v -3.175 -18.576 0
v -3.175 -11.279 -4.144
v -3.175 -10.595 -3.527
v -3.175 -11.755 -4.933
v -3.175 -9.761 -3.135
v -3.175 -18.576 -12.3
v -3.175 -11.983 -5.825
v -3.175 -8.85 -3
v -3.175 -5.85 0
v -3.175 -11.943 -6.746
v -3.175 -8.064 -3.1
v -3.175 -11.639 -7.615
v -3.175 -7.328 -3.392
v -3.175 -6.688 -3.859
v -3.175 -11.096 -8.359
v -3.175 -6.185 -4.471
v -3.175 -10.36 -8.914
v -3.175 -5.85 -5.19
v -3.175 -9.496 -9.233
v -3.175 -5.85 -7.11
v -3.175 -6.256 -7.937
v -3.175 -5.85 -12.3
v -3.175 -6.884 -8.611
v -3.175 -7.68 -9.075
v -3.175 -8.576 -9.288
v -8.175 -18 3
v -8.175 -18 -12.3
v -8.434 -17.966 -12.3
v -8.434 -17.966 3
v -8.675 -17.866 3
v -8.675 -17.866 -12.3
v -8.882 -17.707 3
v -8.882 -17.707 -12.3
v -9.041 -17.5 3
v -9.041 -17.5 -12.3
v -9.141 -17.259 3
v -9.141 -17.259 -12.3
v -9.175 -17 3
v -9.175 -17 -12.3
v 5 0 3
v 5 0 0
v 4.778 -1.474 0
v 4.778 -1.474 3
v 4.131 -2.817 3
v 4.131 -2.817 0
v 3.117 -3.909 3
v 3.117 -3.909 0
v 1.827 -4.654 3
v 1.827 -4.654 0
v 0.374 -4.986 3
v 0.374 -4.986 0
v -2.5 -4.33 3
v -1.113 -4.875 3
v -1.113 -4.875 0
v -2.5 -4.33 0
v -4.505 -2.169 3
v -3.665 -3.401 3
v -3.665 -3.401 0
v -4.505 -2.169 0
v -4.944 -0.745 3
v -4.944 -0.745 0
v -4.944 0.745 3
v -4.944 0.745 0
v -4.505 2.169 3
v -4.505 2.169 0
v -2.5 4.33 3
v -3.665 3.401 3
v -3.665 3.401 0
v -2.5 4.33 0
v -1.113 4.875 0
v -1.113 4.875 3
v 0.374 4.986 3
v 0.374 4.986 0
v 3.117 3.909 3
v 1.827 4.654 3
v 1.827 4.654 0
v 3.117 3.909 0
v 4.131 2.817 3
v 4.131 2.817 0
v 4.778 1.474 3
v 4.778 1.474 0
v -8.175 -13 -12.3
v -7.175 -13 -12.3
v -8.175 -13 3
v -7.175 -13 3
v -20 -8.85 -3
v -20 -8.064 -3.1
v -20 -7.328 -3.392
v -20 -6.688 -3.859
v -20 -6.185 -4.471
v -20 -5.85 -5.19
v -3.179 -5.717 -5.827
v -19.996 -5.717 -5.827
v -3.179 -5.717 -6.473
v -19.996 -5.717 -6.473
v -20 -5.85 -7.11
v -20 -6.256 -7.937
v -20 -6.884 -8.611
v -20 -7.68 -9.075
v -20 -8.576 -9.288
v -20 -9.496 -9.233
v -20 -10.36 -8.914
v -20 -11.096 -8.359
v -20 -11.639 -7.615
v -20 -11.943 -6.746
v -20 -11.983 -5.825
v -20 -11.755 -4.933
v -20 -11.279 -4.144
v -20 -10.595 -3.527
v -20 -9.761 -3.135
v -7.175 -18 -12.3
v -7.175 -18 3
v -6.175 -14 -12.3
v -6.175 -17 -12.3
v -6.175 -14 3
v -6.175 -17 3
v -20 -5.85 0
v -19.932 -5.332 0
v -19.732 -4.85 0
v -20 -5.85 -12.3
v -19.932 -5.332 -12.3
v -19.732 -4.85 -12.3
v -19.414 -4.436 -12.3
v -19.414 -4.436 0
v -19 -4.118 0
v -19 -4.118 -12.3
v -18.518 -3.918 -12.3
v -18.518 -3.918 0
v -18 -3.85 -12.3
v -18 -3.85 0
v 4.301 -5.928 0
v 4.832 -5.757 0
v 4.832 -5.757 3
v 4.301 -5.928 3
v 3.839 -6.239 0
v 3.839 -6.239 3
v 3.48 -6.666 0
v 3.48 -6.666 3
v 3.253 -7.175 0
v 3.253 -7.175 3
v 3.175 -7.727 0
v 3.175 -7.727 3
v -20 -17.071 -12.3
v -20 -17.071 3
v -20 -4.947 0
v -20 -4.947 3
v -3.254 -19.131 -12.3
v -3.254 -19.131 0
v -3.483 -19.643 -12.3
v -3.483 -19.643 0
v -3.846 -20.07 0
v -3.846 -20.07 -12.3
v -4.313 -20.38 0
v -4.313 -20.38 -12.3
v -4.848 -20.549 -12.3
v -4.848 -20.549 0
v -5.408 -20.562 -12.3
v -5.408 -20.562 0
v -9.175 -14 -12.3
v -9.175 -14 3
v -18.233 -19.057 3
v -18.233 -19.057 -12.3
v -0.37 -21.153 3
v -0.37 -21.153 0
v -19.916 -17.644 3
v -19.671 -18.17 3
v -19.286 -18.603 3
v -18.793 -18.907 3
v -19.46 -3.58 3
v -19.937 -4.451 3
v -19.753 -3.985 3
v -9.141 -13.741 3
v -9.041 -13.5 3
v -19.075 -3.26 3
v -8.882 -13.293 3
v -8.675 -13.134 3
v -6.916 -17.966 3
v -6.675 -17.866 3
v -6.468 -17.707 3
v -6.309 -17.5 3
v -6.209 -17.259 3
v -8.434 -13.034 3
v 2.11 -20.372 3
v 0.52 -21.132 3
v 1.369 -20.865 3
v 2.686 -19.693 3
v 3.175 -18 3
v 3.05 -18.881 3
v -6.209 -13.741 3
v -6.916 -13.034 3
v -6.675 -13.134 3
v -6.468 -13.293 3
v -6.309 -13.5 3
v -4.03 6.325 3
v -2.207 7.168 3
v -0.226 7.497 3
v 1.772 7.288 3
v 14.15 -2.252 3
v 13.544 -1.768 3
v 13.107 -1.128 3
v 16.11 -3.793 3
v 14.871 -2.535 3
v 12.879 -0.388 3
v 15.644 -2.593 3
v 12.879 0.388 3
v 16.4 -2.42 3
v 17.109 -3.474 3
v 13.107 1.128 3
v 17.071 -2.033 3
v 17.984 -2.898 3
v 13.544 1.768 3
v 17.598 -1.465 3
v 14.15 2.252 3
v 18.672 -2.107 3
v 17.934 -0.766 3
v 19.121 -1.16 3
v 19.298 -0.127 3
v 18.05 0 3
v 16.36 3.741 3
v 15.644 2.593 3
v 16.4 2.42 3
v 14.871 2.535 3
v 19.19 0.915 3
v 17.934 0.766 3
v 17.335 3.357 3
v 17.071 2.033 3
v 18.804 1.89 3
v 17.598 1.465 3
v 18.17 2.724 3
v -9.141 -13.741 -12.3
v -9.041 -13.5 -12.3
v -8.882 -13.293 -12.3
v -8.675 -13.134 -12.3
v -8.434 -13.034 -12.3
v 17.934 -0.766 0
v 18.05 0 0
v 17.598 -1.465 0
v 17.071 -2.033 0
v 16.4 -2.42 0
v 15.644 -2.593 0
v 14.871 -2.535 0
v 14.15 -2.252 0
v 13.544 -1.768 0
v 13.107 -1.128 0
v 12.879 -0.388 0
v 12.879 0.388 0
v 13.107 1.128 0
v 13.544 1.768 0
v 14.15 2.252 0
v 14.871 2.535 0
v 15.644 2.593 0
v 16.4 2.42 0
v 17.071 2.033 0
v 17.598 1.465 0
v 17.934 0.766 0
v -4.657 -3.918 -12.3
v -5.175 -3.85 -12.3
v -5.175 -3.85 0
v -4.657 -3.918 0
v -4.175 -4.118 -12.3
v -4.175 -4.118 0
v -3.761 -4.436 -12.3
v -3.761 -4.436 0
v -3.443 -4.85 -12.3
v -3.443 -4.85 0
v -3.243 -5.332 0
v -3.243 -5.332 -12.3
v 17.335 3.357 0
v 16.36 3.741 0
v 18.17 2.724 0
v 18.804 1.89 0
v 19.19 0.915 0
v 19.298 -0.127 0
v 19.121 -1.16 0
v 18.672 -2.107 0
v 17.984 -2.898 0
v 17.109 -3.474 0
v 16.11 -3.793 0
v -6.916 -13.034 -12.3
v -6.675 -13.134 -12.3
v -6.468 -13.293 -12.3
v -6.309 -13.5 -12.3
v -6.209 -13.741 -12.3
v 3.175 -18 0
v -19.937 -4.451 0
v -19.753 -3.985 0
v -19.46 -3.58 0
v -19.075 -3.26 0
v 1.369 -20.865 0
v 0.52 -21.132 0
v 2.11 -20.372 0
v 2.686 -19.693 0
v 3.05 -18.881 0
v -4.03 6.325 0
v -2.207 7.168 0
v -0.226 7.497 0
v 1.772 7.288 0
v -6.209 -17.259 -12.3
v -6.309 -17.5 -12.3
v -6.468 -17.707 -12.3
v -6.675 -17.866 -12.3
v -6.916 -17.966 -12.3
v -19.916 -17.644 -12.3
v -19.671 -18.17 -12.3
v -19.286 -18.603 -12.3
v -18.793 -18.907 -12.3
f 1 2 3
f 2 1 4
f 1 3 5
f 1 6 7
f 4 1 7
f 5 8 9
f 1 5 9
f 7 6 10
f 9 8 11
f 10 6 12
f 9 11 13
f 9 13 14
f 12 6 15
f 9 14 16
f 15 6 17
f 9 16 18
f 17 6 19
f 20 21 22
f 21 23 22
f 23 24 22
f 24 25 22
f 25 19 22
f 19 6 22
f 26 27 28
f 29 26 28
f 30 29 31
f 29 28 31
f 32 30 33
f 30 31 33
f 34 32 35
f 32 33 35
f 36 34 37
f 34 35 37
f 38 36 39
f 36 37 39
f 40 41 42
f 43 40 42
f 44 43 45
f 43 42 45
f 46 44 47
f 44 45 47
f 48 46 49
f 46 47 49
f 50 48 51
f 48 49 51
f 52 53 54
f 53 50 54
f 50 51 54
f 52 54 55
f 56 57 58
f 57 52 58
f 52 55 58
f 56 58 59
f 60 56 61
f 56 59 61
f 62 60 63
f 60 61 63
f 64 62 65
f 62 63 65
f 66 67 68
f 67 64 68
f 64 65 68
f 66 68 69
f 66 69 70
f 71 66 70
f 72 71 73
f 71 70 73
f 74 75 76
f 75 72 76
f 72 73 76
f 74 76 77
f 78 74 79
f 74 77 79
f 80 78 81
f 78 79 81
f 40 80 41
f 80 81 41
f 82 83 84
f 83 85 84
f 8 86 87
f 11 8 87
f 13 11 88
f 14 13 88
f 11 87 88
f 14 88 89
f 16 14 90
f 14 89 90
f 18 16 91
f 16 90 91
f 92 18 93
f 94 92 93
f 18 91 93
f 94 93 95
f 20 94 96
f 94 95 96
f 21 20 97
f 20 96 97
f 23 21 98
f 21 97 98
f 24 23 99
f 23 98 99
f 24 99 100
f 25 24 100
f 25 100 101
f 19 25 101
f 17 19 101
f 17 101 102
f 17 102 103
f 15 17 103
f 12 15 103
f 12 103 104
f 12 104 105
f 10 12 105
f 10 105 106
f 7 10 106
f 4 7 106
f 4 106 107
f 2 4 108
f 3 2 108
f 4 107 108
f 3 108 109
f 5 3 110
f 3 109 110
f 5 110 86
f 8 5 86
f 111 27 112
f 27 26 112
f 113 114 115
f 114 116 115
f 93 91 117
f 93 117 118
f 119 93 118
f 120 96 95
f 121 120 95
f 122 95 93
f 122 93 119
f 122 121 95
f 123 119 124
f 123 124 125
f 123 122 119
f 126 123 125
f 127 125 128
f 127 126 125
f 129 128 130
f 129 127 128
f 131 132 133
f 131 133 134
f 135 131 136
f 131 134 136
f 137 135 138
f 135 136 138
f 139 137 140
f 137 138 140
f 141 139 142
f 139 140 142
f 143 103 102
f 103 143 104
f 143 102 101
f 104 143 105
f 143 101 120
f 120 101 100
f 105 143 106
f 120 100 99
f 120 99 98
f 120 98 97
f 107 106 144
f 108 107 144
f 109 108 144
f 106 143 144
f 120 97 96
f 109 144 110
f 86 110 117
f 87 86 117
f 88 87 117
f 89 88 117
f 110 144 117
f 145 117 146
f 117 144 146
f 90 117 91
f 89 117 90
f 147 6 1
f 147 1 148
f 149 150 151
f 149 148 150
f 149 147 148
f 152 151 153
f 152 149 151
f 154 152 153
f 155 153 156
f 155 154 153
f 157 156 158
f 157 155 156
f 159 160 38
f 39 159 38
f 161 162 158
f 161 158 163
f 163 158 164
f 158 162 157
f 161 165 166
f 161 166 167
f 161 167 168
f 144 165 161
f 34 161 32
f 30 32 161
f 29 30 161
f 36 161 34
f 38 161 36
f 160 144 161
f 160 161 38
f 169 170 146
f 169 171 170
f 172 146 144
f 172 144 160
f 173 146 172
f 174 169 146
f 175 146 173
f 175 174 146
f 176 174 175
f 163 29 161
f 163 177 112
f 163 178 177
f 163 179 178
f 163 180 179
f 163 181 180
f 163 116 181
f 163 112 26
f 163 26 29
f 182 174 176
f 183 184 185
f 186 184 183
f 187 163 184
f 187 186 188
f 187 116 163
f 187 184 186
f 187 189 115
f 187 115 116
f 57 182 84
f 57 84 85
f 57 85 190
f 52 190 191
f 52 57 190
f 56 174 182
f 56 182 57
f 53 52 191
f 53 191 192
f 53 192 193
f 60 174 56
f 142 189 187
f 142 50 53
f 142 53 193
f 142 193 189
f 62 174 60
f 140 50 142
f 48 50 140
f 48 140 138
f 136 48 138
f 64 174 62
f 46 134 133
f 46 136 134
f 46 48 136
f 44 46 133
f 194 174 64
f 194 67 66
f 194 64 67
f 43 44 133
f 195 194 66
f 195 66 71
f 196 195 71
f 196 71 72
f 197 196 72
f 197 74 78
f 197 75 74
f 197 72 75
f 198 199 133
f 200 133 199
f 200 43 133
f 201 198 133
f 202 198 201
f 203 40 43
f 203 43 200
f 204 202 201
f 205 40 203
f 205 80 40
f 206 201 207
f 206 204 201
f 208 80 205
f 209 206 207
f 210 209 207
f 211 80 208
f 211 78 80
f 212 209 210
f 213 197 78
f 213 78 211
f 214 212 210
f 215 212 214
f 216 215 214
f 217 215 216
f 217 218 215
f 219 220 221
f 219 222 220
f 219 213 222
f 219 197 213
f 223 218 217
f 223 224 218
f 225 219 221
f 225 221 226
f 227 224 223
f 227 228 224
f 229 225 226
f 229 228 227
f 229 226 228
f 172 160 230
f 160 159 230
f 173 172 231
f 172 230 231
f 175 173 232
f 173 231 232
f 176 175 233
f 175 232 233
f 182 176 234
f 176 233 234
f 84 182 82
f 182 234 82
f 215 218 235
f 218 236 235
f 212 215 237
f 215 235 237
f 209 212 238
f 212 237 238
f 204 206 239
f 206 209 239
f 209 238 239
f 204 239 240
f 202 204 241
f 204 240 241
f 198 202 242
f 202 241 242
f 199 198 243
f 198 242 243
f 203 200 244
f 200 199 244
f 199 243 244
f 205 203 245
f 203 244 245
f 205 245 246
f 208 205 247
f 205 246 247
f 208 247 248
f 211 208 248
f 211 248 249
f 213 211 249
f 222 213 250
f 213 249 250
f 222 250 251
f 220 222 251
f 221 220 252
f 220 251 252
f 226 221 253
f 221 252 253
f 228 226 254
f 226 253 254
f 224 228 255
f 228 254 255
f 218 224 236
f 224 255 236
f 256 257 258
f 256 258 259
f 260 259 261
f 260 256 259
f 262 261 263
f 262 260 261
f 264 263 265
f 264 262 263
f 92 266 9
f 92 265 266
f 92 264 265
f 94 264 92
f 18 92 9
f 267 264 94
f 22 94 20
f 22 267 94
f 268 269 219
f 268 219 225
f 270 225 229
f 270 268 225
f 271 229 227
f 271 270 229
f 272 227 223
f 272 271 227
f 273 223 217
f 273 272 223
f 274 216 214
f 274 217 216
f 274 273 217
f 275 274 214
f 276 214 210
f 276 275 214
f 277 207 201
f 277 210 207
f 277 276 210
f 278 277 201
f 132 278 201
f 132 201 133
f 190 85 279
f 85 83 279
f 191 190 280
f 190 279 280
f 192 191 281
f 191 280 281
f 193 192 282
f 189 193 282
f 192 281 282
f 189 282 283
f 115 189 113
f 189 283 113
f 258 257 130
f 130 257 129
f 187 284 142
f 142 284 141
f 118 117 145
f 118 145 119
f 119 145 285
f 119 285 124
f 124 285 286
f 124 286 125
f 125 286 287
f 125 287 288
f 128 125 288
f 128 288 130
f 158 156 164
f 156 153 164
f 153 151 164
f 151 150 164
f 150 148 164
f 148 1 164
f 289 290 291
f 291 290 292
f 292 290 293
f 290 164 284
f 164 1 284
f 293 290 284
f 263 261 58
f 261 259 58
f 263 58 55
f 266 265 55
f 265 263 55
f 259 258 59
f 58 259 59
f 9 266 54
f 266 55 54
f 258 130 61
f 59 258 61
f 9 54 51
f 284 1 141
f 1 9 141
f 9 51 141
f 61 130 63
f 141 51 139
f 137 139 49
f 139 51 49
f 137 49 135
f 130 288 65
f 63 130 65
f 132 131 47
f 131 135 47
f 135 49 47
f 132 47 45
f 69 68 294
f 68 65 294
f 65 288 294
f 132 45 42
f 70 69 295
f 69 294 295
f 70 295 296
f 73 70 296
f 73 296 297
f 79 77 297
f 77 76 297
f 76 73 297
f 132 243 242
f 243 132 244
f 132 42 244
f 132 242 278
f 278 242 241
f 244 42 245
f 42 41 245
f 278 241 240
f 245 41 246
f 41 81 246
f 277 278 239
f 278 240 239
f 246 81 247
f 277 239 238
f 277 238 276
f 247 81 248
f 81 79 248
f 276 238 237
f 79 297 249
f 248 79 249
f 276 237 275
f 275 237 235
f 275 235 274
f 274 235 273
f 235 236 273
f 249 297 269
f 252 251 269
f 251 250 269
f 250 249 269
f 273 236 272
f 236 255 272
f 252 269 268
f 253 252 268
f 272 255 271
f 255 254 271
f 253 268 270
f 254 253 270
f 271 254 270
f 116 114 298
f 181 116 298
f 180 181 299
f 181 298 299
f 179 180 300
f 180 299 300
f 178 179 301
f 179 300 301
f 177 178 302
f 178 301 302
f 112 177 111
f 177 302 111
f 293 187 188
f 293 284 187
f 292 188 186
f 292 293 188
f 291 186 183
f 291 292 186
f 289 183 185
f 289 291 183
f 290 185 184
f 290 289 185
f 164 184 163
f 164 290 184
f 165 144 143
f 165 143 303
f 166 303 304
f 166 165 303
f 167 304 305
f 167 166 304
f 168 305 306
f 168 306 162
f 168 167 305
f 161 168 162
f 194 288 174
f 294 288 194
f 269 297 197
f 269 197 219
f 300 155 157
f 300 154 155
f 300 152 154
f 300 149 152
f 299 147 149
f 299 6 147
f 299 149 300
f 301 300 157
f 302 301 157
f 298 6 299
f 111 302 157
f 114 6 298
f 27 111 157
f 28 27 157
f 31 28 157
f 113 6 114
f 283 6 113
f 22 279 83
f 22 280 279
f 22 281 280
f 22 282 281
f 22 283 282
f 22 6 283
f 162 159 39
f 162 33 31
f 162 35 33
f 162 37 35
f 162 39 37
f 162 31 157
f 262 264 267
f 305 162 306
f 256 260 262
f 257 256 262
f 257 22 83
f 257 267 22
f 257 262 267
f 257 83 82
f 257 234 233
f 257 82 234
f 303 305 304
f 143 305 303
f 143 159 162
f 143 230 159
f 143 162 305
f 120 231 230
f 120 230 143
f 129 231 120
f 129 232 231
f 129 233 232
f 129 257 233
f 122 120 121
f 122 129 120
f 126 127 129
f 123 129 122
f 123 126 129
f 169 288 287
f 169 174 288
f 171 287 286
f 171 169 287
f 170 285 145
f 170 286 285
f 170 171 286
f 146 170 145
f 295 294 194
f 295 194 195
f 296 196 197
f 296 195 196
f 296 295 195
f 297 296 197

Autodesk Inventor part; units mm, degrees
ref_plane "YZ Plane" through (0, 0, 0) normal (1, 0, 0) x (0, 1, 0)
ref_plane "XZ Plane" through (0, 0, 0) normal (0, 1, 0) x (-1, 0, 0)
ref_plane "XY Plane" through (0, 0, 0) normal (0, 0, 1) x (1, 0, 0)
sketch "Sketch1" plane through (0, 0, 0) normal (0, 0, 1) x (1, 0, 0)
  circle A0 centre (0, 0) radius 5
  circle A1 centre (15.45, 0) radius 2.6
  arc A2 (16.1104, -3.7929) -> (16.3595, 3.741) centre (15.45, 0) ccw
  arc A3 (1.7718, 7.2877) -> (-3.175, -6.7948) centre (0, 0) ccw
  line L0 (1.7718, 7.2877) -> (16.3595, 3.741)
  arc A4 (-3.175, -18) -> (3.175, -18) centre (0, -18) ccw
  line L1 (3.175, -18) -> (3.175, -6.045)
  line L2 (-3.175, -6.7948) -> (-3.175, -18)
  line L3 (-20, -8.85) -> (-20, -3.85)
  line L4 (-20, -8.85) -> (-20, -18.85)
  line L5 (-20, -3.85) -> (-4.0301, 6.3252)
  line L6 (-20, -3.85) -> (-6.4364, -3.85)
  line L7 (-20, -18.85) -> (-0.37, -21.1534)
  line L8 (16.1104, -3.7929) -> (3.175, -6.045)
  line L9 (-3.175, -18) -> (-3.175, -20.8242)
  point P0 (-20, -5.6718)
  dimension "d0" = 15.45
  dimension "d1" = 5.2
  dimension "d2" = 10
  dimension "d3" = 0
  dimension "d4" = 7.7
  dimension "d5" = 15
  dimension "d6" = 6.35
  dimension "d7" = 0
  dimension "d9" = 18
  dimension "d21" = 8.85
  dimension "d22" = 20
  dimension "d23" = 5
  dimension "d24" = 10
extrude "Extrusion3" add sketch "Sketch1" along normal blind 3
fillet "Fillet7" radius 2 1 edges at (3.175, -6.045, 1.5)
extrude "Extrusion6" add sketch "Sketch1" against normal blind 12.3 contours A3 L2 L9 L7 L4 L3 L6
sketch "Sketch5" plane through (-20, -18.85, 3) normal (-1, 0, 0) x (0, 0, 1)
  line L0 (-3, 26.35) -> (0, 26.35) projected
  line L1 (0, 15) -> (0, 0) projected
  circle A0 centre (-9.15, 10) radius 3.15
  line L2 (-3, -1.9742) -> (-3, 12.0552) projected
  point P0 (-3, 18.85)
  point P1 (-3, 13.1782)
  point P2 (-3, 10)
  dimension "d43" = 6.3
  dimension "d44" = 0
  dimension "d45" = 6.15
sketch "Sketch6" plane through (0, 0, 3) normal (0, 0, 1) x (1, 0, 0)
  line L0 (-20, -12) -> (-3.175, -12) projected
  circle A0 centre (0, 0) radius 5 projected
  circle A1 centre (15.45, 0) radius 2.6 projected
  line L1 (-4.0301, 6.3252) -> (-20, -3.85) projected
  line L2 (-20, -3.85) -> (-20, -18.85) projected
  line L3 (-20, -18.85) -> (-0.37, -21.1534) projected
  arc A2 (-0.37, -21.1534) -> (3.175, -18) centre (0, -18) ccw projected
  line L4 (3.175, -18) -> (3.175, -7.7269) projected
  arc A3 (4.832, -5.7565) -> (3.175, -7.7269) centre (5.175, -7.7269) ccw projected
  line L5 (4.832, -5.7565) -> (16.1104, -3.7929) projected
  arc A4 (16.1104, -3.7929) -> (16.3595, 3.741) centre (15.45, 0) ccw projected
  line L6 (16.3595, 3.741) -> (1.7718, 7.2877) projected
  arc A5 (1.7718, 7.2877) -> (-4.0301, 6.3252) centre (0, 0) ccw projected
  line L7 (-20, -5.7) -> (-4.8744, -5.7) projected
  line L8 (-3.175, -20.8242) -> (-3.175, -6.7948) projected
  line L9 (-3.175, -6.7948) -> (-3.175, -20.8242) projected
  line L10 (-9.175, -18) -> (-6.175, -18)
  line L11 (-6.175, -18) -> (-6.175, -13)
  line L12 (-6.175, -13) -> (-9.175, -13)
  line L13 (-9.175, -13) -> (-9.175, -18)
  dimension "d55" = 5
  dimension "d56" = 3
  dimension "d57" = 3
  dimension "d58" = 1
extrude "Extrusion8" cut sketch "Sketch6" against normal up to next contours L13 L12 L11 L10
fillet "Fillet8" radius 2 1 edges at (-20, -18.85, -4.65)
fillet "Fillet9" radius 2 1 edges at (-20, -3.85, -6.15)
fillet "Fillet10" radius 1 1 edges at (-6.175, -18, -4.65)
fillet "Fillet11" radius 1 1 edges at (-9.175, -18, -4.65)
fillet "Fillet12" radius 1 1 edges at (-9.175, -13, -4.65)
fillet "Fillet13" radius 1 1 edges at (-6.175, -13, -4.65)
fillet "Fillet14" radius 2 1 edges at (-3.175, -20.8242, -6.15)
fillet "Fillet18" radius 2 1 edges at (-20, -3.85, 1.5)
sketch "Sketch8" plane through (0, 0, -12.3) normal (0, 0, -1) x (-1, 0, 0)
  line L0 (18, -3.85) -> (6.4364, -3.85) projected
  line L1 (6.175, -17) -> (6.175, -14) projected
  arc A0 (7.175, -13) -> (6.175, -14) centre (7.175, -14) ccw projected
  line L2 (7.175, -13) -> (8.175, -13) projected
  arc A1 (9.175, -14) -> (8.175, -13) centre (8.175, -14) ccw projected
  line L3 (9.175, -14) -> (9.175, -17) projected
  arc A2 (8.175, -18) -> (9.175, -17) centre (8.175, -17) ccw projected
  line L4 (8.175, -18) -> (7.175, -18) projected
  arc A3 (6.175, -17) -> (7.175, -18) centre (7.175, -17) ccw projected
  arc A4 (3.175, -18.5758) -> (5.4081, -20.5622) centre (5.175, -18.5758) ccw projected
  line L5 (5.4081, -20.5622) -> (18.2331, -19.0573) projected
  arc A5 (18.2331, -19.0573) -> (20, -17.071) centre (18, -17.071) ccw projected
  line L6 (20, -17.071) -> (20, -5.85) projected
  arc A6 (20, -5.85) -> (18, -3.85) centre (18, -5.85) ccw projected
  line L7 (18, -3.85) -> (6.4364, -3.85) projected
  arc A7 (3.175, -6.7948) -> (6.4364, -3.85) centre (0, 0) ccw projected
  line L8 (3.175, -6.7948) -> (3.175, -18.5758) projected
  line L9 (19.9944, -5.7) -> (4.8744, -5.7) projected
  circle A8 centre (0, 0) radius 7.5
  line L10 (3.175, -6.7948) -> (3.175, -3.85)
  line L11 (3.175, -3.85) -> (6.4364, -3.85)
extrude "Extrusion9" add sketch "Sketch8" against normal up to surface (12.3 mm away) contours A7 L10 L11
extrude "Extrusion10" cut sketch "Sketch5" against normal up to next
fillet "Fillet19" radius 2 1 edges at (-3.175, -3.85, -6.15)
properties part number "bowden_tube_holder"
